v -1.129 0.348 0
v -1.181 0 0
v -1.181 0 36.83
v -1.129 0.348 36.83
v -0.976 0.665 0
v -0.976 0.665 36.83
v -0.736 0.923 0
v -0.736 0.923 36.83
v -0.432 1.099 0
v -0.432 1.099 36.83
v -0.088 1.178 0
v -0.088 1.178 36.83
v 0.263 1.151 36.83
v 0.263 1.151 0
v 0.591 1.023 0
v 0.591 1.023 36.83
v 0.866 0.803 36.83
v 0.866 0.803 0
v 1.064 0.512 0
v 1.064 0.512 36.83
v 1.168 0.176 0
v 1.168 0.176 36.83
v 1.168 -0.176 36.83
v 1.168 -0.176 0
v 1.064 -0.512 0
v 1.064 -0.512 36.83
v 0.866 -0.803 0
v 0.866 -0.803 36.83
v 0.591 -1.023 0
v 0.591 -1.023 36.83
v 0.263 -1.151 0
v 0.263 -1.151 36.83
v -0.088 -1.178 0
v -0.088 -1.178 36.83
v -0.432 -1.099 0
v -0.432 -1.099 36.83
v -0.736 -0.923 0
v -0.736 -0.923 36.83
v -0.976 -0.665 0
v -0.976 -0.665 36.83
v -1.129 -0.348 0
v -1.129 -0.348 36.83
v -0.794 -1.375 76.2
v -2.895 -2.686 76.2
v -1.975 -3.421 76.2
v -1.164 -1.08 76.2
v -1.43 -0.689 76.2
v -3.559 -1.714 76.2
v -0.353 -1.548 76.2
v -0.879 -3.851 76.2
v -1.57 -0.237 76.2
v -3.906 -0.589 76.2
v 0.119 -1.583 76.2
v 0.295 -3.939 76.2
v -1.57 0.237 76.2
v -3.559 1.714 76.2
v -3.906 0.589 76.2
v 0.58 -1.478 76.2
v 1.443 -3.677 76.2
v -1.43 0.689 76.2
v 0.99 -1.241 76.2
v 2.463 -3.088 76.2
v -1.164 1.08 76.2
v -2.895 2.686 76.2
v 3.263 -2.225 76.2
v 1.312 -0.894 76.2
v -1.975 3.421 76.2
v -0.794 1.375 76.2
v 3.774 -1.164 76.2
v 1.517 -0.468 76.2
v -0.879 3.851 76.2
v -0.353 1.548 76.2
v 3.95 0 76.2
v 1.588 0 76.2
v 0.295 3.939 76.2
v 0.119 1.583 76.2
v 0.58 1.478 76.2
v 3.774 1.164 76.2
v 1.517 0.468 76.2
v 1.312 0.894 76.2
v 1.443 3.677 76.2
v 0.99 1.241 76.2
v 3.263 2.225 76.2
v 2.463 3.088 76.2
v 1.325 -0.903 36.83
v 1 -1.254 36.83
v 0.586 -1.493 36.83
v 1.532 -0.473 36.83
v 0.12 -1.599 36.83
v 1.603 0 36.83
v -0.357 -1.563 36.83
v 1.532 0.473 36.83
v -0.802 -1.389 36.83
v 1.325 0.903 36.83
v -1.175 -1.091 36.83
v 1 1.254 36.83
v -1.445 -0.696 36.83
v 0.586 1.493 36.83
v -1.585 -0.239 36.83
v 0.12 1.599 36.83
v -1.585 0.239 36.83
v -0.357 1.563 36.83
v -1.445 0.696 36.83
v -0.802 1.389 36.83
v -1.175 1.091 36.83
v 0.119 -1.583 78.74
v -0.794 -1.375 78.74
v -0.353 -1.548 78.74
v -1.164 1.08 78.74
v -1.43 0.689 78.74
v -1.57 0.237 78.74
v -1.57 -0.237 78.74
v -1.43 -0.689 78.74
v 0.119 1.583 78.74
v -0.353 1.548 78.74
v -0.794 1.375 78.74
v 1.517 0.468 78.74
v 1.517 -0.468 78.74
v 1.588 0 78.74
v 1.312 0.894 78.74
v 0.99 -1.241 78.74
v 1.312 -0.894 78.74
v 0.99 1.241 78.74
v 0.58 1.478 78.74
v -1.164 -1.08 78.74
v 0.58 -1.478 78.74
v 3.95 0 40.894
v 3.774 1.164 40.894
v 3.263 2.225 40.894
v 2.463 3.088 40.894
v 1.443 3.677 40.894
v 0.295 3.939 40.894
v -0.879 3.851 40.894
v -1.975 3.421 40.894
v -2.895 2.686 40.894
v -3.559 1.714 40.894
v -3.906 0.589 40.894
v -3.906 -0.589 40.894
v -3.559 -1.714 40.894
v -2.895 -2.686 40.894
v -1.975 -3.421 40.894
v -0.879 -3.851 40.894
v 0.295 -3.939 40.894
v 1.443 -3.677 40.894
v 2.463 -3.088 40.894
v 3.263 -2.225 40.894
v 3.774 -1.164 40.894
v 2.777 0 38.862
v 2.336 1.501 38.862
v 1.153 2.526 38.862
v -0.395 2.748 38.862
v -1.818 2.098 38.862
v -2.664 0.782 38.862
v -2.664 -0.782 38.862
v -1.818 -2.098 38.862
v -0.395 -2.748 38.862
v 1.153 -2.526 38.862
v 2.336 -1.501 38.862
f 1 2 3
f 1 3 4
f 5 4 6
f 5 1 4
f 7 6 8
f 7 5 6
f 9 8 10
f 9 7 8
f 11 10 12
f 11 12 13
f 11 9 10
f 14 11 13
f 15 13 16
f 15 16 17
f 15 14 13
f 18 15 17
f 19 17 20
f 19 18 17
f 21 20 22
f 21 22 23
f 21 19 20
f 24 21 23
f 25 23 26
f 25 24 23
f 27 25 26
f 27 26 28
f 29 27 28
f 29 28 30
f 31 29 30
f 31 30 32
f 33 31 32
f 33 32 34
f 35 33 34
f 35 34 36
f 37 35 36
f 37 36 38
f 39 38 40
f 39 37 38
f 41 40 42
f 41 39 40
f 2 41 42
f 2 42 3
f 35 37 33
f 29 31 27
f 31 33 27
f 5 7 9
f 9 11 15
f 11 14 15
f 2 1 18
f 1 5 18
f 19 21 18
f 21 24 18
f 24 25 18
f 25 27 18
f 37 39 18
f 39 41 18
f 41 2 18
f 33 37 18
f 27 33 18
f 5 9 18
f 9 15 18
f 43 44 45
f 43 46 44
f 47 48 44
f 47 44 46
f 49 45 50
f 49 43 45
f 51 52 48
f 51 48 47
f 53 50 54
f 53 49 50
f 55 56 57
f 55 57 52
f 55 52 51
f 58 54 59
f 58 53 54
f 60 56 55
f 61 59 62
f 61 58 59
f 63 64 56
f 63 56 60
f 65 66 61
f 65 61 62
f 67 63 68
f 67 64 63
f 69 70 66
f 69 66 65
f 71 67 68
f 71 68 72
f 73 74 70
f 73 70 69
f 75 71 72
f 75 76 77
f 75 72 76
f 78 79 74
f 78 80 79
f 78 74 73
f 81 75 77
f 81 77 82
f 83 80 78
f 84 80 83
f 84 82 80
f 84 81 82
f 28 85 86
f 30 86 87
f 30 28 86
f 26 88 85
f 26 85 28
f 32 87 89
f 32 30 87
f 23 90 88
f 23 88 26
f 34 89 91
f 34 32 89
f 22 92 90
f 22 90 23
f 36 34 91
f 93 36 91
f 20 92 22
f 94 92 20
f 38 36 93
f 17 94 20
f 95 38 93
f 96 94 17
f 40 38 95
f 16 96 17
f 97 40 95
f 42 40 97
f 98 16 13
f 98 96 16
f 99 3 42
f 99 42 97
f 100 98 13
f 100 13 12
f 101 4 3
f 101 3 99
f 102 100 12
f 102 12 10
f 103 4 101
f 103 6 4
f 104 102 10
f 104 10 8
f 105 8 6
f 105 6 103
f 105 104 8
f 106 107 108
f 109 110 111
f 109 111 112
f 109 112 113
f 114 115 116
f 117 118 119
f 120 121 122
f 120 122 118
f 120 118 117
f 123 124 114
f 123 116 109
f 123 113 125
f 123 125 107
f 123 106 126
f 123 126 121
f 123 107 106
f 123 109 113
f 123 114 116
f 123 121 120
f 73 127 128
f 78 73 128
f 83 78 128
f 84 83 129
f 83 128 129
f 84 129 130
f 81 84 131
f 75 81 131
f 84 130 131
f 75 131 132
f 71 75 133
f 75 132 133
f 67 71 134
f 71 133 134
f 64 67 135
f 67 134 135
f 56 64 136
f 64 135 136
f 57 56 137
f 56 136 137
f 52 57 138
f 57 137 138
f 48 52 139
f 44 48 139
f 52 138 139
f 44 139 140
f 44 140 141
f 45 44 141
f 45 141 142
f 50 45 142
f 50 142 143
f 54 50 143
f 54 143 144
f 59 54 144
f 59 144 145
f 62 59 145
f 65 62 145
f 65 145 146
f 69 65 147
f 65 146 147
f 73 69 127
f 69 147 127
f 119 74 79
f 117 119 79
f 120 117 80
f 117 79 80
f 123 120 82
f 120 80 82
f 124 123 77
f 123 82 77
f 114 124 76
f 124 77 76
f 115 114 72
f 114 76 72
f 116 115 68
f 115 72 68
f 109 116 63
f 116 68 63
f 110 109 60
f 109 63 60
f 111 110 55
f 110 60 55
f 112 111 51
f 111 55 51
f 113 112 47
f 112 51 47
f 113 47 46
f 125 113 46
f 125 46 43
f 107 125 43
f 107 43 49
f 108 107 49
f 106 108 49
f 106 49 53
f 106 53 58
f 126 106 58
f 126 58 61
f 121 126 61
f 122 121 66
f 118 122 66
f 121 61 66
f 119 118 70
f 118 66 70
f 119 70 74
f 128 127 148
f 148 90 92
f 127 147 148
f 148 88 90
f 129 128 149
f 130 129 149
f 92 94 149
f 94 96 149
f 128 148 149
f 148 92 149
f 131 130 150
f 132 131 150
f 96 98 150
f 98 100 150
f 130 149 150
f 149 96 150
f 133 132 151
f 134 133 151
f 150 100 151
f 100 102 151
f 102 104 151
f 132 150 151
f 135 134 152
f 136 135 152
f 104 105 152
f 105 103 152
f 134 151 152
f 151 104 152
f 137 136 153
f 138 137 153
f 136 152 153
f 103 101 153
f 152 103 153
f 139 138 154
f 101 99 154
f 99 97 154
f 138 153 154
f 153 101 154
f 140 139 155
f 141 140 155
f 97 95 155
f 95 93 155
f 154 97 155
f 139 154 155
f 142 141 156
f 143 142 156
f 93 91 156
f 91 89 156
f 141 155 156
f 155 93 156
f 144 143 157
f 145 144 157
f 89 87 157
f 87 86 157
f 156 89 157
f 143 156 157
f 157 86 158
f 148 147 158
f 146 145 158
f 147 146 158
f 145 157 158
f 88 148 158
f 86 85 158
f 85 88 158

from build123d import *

# Parameters (mm, degrees)
SKETCH1_R           = 3.9497
BOSS_EXTRUDE1_DEPTH = 78.74
CUT_EXTRUDE1_START  = -2.54
SKETCH2_R           = 3.9497
SKETCH2_R_2         = 1.5875
CUT_EXTRUDE1_DEPTH  = 2.54
SKETCH4_R           = 3.9497
SKETCH4_R_2         = 1.1811
CUT_EXTRUDE3_DEPTH  = 36.83
CHAMFER1_SIZE       = 4.064
CHAMFER1_SIZE2      = 2.346351494


with BuildPart() as part:
    # Sketch1 → Boss-Extrude1 (new body)
    with BuildSketch(Plane.XY):
        Circle(SKETCH1_R)
    extrude(amount=BOSS_EXTRUDE1_DEPTH)

    # Sketch2 → Cut-Extrude1 (cut)
    with BuildSketch(Plane.XY.offset(78.74).offset(CUT_EXTRUDE1_START)):
        Circle(SKETCH2_R)
        Circle(SKETCH2_R_2, mode=Mode.SUBTRACT)
    extrude(amount=CUT_EXTRUDE1_DEPTH, mode=Mode.SUBTRACT)

    # Sketch4 → Cut-Extrude3 (cut)
    with BuildSketch(Plane(origin=(0, 0, 0), x_dir=(-1, 0, 0), z_dir=(0, 0, -1))):
        Circle(SKETCH4_R)
        Circle(SKETCH4_R_2, mode=Mode.SUBTRACT)
    extrude(amount=-CUT_EXTRUDE3_DEPTH, mode=Mode.SUBTRACT)

    # Chamfer1
    chamfer1_edges = [part.edges().sort_by_distance(p)[0] for p in [
        (-3.9497, 0, 36.83),
    ]]
    chamfer1_side = [part.faces().sort_by_distance(p)[0] for p in [
        (-3.9497, 0, 56.515),
    ]]
    chamfer(chamfer1_edges, length=CHAMFER1_SIZE, length2=CHAMFER1_SIZE2, reference=chamfer1_side[0])


solid = part.part
